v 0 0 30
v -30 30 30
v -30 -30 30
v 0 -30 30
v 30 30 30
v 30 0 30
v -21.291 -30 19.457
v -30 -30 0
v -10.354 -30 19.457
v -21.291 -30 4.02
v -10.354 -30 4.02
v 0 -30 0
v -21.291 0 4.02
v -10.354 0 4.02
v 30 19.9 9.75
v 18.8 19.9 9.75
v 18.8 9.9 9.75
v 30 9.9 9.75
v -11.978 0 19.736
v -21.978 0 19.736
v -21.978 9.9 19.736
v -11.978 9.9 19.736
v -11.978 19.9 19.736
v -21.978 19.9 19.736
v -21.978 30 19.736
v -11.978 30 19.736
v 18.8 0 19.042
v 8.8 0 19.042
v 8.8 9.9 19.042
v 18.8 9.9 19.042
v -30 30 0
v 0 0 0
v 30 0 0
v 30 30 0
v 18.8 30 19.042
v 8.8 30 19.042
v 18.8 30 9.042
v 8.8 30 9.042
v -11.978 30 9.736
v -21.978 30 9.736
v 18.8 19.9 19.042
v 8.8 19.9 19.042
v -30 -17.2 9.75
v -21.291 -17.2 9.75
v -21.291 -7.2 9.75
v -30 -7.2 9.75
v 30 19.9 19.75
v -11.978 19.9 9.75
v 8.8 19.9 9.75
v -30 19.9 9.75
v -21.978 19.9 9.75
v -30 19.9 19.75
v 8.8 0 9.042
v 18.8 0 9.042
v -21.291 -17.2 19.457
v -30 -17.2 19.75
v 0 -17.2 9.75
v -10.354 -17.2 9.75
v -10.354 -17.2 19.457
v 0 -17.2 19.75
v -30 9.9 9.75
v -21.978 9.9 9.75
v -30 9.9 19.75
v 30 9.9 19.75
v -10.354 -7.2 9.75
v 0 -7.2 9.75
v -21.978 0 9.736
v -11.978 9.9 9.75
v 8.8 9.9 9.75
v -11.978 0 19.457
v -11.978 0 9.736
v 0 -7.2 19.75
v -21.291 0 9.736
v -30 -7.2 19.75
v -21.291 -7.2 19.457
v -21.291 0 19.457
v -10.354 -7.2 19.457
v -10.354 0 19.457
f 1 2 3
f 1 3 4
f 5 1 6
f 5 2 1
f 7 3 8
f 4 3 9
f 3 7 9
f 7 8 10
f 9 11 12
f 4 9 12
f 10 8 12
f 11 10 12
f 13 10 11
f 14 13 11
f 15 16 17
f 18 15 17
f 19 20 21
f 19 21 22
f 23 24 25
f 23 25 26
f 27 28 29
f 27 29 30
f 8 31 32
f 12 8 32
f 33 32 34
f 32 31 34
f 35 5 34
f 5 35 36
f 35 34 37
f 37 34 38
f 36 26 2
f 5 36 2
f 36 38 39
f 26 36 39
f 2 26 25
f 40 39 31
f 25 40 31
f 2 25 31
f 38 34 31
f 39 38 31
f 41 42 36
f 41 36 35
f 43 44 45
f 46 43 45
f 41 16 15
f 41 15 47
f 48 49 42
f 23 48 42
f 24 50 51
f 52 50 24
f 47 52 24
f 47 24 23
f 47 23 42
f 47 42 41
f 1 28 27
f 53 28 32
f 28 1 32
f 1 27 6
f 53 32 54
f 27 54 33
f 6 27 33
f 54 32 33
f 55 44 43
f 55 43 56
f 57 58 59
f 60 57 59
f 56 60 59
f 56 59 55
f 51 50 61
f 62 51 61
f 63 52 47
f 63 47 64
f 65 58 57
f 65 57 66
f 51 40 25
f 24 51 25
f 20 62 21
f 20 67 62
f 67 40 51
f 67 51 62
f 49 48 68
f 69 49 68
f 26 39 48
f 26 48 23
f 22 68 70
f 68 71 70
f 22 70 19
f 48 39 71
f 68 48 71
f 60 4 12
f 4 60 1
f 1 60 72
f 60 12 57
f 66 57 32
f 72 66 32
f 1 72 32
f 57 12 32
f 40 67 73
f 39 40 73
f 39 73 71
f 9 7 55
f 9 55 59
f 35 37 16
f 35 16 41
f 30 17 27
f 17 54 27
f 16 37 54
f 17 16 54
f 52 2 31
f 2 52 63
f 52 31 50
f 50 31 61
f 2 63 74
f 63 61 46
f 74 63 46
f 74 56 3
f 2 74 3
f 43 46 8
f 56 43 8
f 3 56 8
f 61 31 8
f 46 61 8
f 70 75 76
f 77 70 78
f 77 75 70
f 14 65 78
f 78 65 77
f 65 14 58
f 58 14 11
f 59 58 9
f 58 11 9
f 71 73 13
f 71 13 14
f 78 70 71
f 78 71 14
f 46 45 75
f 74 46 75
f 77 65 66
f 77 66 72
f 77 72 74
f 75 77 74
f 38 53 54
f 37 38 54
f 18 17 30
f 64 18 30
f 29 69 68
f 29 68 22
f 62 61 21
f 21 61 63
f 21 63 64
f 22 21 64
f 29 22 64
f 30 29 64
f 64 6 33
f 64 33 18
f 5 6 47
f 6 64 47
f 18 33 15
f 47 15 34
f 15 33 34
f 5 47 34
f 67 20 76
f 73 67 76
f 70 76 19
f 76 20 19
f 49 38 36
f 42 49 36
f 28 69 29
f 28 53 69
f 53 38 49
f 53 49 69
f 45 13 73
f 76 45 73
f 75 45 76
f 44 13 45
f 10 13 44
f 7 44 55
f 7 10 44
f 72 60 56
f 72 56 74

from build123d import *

# Parameters (mm, degrees)
F1_DEPTH  = 30
F2_W      = 10
F2_H      = 10
F3_DEPTH  = 30
F4_W      = 10
F4_H      = 10
F5_DEPTH  = 30
F6_W      = 10
F6_H      = 10
F7_DEPTH  = 60
F8_W      = 10
F8_H      = 10
F9_DEPTH  = 60
F10_W     = 10.937084
F10_H     = 15.436338
F11_DEPTH = 30


with BuildPart() as f1:
    # F0 (on Top) → F1 (new body)
    with BuildSketch(Plane.XY):
        Polygon((30, 30), (0, 30), (-30, 30), (-30, 0), (-30, -30), (0, -30), (0, 0), (30, 0), align=None)
    extrude(amount=F1_DEPTH)

    # F2 (on Front) → F3 (cut)
    with BuildSketch(Plane.XZ):
        with Locations((13.8, 14.042104)):
            Rectangle(F2_W, F2_H)
    extrude(amount=-F3_DEPTH, mode=Mode.SUBTRACT)

    # F4 (on face) → F5 (cut)
    with BuildSketch(Plane.YZ):
        with Locations((-12.199999, 14.75)):
            Rectangle(F4_W, F4_H)
    extrude(amount=-F5_DEPTH, mode=Mode.SUBTRACT)

    # F6 (on face) → F7 (cut)
    with BuildSketch(Plane(origin=(-30, 0, 0), x_dir=(0, -1, 0), z_dir=(-1, 0, 0))):
        with Locations((-14.900001, 14.75)):
            Rectangle(F6_W, F6_H)
    extrude(amount=-F7_DEPTH, mode=Mode.SUBTRACT)

    # F8 (on Front) → F9 (cut)
    with BuildSketch(Plane.XZ):
        with Locations((-16.978183, 14.736477)):
            Rectangle(F8_W, F8_H)
    extrude(amount=-F9_DEPTH, mode=Mode.SUBTRACT)

    # F10 (on face) → F11 (cut)
    with BuildSketch(Plane.XZ.offset(30)):
        with Locations((-15.822794, 11.738348)):
            Rectangle(F10_W, F10_H)
    extrude(amount=-F11_DEPTH, mode=Mode.SUBTRACT)


with BuildPart() as f12_1:
    # F12: copy of F1
    add(f1.part)


solid = f1.part
